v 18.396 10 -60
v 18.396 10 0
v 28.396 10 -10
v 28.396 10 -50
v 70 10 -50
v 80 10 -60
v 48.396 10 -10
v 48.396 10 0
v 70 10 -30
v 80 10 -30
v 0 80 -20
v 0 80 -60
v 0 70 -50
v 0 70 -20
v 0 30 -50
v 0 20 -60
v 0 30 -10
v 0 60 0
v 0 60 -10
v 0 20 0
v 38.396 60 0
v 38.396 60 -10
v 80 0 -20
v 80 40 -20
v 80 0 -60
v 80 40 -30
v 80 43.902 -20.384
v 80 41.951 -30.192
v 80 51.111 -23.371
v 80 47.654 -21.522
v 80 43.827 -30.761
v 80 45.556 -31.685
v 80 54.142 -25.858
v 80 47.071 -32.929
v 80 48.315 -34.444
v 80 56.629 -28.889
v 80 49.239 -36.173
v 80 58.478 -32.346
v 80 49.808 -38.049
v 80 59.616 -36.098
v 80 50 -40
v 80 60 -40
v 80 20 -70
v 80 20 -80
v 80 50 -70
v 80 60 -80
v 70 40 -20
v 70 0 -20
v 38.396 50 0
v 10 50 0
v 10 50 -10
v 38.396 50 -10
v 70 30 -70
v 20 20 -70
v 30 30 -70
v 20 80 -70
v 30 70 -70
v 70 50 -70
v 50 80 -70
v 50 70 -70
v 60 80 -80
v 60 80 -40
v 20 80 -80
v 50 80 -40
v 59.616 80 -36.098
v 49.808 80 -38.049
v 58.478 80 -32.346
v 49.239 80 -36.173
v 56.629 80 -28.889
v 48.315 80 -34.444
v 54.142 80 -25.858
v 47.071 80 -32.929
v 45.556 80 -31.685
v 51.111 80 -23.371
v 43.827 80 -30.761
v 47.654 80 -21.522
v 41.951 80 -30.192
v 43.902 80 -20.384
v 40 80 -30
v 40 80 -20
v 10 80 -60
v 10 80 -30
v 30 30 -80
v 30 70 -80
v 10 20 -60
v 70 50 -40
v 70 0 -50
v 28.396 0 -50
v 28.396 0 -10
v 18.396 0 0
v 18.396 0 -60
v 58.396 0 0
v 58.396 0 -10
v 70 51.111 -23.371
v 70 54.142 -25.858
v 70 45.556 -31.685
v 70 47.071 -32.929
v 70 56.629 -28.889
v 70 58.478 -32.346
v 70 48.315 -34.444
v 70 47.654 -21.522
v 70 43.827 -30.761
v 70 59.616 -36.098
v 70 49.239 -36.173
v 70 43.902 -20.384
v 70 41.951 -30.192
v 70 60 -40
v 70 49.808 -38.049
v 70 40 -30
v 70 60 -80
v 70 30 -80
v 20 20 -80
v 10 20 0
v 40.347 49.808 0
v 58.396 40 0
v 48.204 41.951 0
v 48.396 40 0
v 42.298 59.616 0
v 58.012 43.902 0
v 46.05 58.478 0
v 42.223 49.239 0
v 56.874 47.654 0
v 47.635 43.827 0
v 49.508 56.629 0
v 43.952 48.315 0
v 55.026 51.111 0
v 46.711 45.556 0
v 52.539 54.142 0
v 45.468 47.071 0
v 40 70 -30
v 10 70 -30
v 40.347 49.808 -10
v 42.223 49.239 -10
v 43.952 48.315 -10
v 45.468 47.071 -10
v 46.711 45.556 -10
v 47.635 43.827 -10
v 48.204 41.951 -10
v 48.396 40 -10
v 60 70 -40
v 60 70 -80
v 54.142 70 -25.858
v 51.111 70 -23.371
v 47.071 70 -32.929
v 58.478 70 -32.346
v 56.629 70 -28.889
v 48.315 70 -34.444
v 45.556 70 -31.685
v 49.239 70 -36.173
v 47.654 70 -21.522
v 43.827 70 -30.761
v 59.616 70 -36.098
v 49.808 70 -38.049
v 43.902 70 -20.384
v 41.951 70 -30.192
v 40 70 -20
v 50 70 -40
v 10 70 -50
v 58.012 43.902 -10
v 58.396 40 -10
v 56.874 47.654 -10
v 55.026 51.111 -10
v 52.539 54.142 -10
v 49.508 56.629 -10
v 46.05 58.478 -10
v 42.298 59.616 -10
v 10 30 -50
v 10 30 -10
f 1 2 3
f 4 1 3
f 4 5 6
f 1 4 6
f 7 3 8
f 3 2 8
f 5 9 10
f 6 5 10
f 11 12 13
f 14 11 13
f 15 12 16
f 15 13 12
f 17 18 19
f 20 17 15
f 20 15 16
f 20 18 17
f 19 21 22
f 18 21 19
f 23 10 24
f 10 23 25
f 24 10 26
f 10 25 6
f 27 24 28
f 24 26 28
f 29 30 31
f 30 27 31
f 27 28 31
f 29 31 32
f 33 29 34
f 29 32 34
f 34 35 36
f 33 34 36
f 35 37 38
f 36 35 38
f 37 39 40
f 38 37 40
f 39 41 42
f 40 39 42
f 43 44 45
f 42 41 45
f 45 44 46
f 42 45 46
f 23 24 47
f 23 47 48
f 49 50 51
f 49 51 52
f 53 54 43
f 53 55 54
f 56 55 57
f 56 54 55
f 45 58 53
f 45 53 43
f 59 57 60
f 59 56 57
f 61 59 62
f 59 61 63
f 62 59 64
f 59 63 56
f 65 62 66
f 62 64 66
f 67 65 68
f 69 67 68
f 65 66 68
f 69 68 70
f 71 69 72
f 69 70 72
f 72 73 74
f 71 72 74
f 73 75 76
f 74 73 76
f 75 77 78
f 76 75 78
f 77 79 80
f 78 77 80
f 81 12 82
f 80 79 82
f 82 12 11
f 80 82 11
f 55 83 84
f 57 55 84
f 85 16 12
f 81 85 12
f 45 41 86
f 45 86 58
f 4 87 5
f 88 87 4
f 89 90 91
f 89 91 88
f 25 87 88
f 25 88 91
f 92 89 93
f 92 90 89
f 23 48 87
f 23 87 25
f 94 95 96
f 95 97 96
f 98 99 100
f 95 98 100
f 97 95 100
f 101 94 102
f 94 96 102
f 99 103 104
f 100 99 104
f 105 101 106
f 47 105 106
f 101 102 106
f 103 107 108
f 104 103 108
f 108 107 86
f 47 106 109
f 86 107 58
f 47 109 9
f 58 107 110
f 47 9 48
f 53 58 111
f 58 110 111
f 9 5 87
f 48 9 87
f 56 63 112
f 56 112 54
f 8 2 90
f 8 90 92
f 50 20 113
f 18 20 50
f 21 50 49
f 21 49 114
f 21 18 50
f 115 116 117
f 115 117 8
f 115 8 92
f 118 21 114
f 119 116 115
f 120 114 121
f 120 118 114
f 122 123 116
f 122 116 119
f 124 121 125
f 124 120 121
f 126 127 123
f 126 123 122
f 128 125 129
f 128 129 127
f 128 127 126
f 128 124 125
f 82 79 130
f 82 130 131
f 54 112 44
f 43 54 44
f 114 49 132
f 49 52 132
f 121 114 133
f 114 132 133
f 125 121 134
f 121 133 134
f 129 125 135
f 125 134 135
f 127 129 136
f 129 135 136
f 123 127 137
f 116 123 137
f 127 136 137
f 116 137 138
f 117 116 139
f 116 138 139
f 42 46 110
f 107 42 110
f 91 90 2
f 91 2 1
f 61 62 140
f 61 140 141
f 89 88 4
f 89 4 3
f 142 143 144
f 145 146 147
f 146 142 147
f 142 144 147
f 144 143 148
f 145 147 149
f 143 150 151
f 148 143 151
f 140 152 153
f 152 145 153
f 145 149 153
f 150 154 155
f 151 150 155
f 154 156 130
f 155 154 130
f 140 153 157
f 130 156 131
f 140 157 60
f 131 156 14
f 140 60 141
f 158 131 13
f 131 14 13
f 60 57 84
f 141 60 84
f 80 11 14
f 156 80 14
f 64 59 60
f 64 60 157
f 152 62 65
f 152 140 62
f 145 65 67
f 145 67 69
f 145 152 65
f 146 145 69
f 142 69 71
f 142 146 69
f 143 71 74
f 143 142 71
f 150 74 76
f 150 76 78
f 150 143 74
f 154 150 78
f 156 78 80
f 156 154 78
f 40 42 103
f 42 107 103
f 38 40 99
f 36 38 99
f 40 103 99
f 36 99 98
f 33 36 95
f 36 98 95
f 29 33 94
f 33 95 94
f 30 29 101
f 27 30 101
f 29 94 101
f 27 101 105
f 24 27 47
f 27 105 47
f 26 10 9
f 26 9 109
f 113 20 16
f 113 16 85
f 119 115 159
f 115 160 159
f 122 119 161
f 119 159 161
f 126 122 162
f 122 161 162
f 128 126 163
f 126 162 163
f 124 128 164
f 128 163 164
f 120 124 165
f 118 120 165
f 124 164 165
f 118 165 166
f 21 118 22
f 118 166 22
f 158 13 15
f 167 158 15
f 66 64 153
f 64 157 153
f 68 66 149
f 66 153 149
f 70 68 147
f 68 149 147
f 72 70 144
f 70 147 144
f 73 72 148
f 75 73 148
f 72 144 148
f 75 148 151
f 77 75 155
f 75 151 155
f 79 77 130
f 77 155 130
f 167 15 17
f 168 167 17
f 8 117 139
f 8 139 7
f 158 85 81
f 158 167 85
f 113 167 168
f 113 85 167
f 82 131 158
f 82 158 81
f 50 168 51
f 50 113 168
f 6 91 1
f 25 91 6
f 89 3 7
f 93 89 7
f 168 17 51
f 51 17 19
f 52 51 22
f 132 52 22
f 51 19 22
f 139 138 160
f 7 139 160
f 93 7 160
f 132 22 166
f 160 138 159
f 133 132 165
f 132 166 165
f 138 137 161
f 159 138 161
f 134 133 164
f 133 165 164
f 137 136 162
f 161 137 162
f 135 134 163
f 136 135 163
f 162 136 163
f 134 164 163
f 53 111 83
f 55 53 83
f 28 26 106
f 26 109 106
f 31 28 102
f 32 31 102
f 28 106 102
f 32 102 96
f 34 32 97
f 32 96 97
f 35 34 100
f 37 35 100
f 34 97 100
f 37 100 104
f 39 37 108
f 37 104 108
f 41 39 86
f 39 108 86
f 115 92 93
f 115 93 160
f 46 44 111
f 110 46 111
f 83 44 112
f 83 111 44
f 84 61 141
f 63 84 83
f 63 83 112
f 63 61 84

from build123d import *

# Parameters (mm, degrees)
SKETCH_1_W      = 10
SKETCH_1_H      = 10
EXTRUDE_1_DEPTH = 10
EXTRUDE_2_DEPTH = 10
EXTRUDE_3_DEPTH = 10
EXTRUDE_4_DEPTH = 10
EXTRUDE_5_DEPTH = 10
EXTRUDE_6_DEPTH = 10
FILLET_3_R      = 20
FILLET_4_R      = 10
FILLET_5_R      = 20
FILLET_6_R      = 20
FILLET_7_R      = 10
FILLET_8_R      = 10


with BuildPart() as part:
    # 草图1 → 凸台-拉伸1 (new body)
    with BuildSketch(Plane.XY):
        Polygon((0, 60), (0, 30), (10, 30), (10, 50), (48.396471527, 50), (48.396471527, 10), (28.396471527, 10), (28.396471527, 0), (58.396471527, 0), (58.396471527, 60), align=None)
        with Locations((5, 25)):
            Rectangle(SKETCH_1_W, SKETCH_1_H)
        with Locations((23.396471527, 5)):
            Rectangle(SKETCH_1_W, SKETCH_1_H)
    extrude(amount=-EXTRUDE_1_DEPTH)

    # 草图2 → 凸台-拉伸2 (add)
    with BuildSketch(Plane.ZY):
        Polygon((0, 20), (-60, 20), (-60, 80), (-20, 80), (-20, 70), (-50, 70), (-50, 30), (-10, 30), (-10, 60), (0, 60), align=None)
    extrude(amount=-EXTRUDE_2_DEPTH)

    # 草图3 → 凸台-拉伸3 (add)
    with BuildSketch(Plane(origin=(0, 80, 0), x_dir=(1, 0, 0), z_dir=(0, 1, 0))):
        Polygon((0, 60), (0, 20), (60, 20), (60, 80), (20, 80), (20, 70), (50, 70), (50, 30), (10, 30), (10, 60), align=None)
    extrude(amount=-EXTRUDE_3_DEPTH)

    # 草图4 → 凸台-拉伸4 (add)
    with BuildSketch(Plane(origin=(0, 0, -80), x_dir=(-1, 0, 0), z_dir=(0, 0, -1))):
        Polygon((-60, 80), (-20, 80), (-20, 20), (-80, 20), (-80, 60), (-70, 60), (-70, 30), (-30, 30), (-30, 70), (-60, 70), align=None)
    extrude(amount=-EXTRUDE_4_DEPTH)

    # 草图5 → 凸台-拉伸5 (add)
    with BuildSketch(Plane(origin=(80, 0, 0), x_dir=(0, 0, -1), z_dir=(1, 0, 0))):
        Polygon((80, 60), (20, 60), (20, 0), (60, 0), (60, 10), (30, 10), (30, 50), (70, 50), (70, 20), (80, 20), align=None)
    extrude(amount=-EXTRUDE_5_DEPTH)

    # 草图6 → 凸台-拉伸6 (add)
    with BuildSketch(Plane.XZ):
        Polygon((18.396471527, -10), (18.396471527, -60), (70, -60), (70, -50), (28.396471527, -50), (28.396471527, -10), align=None)
    extrude(amount=-EXTRUDE_6_DEPTH)

    # 圆角3
    fillet_3_edges = [part.edges().sort_by_distance(p)[0] for p in [
        (60, 75, -20),
    ]]
    fillet(fillet_3_edges, radius=FILLET_3_R)

    # 圆角4
    fillet_4_edges = [part.edges().sort_by_distance(p)[0] for p in [
        (50, 75, -30),
    ]]
    fillet(fillet_4_edges, radius=FILLET_4_R)

    # 圆角5
    fillet_5_edges = [part.edges().sort_by_distance(p)[0] for p in [
        (75, 60, -20),
    ]]
    fillet(fillet_5_edges, radius=FILLET_5_R)

    # 圆角6
    fillet_6_edges = [part.edges().sort_by_distance(p)[0] for p in [
        (58.396471527, 60, -5),
    ]]
    fillet(fillet_6_edges, radius=FILLET_6_R)

    # 圆角7
    fillet_7_edges = [part.edges().sort_by_distance(p)[0] for p in [
        (48.396471527, 50, -5),
    ]]
    fillet(fillet_7_edges, radius=FILLET_7_R)

    # 圆角8
    fillet_8_edges = [part.edges().sort_by_distance(p)[0] for p in [
        (75, 50, -30),
    ]]
    fillet(fillet_8_edges, radius=FILLET_8_R)


solid = part.part
